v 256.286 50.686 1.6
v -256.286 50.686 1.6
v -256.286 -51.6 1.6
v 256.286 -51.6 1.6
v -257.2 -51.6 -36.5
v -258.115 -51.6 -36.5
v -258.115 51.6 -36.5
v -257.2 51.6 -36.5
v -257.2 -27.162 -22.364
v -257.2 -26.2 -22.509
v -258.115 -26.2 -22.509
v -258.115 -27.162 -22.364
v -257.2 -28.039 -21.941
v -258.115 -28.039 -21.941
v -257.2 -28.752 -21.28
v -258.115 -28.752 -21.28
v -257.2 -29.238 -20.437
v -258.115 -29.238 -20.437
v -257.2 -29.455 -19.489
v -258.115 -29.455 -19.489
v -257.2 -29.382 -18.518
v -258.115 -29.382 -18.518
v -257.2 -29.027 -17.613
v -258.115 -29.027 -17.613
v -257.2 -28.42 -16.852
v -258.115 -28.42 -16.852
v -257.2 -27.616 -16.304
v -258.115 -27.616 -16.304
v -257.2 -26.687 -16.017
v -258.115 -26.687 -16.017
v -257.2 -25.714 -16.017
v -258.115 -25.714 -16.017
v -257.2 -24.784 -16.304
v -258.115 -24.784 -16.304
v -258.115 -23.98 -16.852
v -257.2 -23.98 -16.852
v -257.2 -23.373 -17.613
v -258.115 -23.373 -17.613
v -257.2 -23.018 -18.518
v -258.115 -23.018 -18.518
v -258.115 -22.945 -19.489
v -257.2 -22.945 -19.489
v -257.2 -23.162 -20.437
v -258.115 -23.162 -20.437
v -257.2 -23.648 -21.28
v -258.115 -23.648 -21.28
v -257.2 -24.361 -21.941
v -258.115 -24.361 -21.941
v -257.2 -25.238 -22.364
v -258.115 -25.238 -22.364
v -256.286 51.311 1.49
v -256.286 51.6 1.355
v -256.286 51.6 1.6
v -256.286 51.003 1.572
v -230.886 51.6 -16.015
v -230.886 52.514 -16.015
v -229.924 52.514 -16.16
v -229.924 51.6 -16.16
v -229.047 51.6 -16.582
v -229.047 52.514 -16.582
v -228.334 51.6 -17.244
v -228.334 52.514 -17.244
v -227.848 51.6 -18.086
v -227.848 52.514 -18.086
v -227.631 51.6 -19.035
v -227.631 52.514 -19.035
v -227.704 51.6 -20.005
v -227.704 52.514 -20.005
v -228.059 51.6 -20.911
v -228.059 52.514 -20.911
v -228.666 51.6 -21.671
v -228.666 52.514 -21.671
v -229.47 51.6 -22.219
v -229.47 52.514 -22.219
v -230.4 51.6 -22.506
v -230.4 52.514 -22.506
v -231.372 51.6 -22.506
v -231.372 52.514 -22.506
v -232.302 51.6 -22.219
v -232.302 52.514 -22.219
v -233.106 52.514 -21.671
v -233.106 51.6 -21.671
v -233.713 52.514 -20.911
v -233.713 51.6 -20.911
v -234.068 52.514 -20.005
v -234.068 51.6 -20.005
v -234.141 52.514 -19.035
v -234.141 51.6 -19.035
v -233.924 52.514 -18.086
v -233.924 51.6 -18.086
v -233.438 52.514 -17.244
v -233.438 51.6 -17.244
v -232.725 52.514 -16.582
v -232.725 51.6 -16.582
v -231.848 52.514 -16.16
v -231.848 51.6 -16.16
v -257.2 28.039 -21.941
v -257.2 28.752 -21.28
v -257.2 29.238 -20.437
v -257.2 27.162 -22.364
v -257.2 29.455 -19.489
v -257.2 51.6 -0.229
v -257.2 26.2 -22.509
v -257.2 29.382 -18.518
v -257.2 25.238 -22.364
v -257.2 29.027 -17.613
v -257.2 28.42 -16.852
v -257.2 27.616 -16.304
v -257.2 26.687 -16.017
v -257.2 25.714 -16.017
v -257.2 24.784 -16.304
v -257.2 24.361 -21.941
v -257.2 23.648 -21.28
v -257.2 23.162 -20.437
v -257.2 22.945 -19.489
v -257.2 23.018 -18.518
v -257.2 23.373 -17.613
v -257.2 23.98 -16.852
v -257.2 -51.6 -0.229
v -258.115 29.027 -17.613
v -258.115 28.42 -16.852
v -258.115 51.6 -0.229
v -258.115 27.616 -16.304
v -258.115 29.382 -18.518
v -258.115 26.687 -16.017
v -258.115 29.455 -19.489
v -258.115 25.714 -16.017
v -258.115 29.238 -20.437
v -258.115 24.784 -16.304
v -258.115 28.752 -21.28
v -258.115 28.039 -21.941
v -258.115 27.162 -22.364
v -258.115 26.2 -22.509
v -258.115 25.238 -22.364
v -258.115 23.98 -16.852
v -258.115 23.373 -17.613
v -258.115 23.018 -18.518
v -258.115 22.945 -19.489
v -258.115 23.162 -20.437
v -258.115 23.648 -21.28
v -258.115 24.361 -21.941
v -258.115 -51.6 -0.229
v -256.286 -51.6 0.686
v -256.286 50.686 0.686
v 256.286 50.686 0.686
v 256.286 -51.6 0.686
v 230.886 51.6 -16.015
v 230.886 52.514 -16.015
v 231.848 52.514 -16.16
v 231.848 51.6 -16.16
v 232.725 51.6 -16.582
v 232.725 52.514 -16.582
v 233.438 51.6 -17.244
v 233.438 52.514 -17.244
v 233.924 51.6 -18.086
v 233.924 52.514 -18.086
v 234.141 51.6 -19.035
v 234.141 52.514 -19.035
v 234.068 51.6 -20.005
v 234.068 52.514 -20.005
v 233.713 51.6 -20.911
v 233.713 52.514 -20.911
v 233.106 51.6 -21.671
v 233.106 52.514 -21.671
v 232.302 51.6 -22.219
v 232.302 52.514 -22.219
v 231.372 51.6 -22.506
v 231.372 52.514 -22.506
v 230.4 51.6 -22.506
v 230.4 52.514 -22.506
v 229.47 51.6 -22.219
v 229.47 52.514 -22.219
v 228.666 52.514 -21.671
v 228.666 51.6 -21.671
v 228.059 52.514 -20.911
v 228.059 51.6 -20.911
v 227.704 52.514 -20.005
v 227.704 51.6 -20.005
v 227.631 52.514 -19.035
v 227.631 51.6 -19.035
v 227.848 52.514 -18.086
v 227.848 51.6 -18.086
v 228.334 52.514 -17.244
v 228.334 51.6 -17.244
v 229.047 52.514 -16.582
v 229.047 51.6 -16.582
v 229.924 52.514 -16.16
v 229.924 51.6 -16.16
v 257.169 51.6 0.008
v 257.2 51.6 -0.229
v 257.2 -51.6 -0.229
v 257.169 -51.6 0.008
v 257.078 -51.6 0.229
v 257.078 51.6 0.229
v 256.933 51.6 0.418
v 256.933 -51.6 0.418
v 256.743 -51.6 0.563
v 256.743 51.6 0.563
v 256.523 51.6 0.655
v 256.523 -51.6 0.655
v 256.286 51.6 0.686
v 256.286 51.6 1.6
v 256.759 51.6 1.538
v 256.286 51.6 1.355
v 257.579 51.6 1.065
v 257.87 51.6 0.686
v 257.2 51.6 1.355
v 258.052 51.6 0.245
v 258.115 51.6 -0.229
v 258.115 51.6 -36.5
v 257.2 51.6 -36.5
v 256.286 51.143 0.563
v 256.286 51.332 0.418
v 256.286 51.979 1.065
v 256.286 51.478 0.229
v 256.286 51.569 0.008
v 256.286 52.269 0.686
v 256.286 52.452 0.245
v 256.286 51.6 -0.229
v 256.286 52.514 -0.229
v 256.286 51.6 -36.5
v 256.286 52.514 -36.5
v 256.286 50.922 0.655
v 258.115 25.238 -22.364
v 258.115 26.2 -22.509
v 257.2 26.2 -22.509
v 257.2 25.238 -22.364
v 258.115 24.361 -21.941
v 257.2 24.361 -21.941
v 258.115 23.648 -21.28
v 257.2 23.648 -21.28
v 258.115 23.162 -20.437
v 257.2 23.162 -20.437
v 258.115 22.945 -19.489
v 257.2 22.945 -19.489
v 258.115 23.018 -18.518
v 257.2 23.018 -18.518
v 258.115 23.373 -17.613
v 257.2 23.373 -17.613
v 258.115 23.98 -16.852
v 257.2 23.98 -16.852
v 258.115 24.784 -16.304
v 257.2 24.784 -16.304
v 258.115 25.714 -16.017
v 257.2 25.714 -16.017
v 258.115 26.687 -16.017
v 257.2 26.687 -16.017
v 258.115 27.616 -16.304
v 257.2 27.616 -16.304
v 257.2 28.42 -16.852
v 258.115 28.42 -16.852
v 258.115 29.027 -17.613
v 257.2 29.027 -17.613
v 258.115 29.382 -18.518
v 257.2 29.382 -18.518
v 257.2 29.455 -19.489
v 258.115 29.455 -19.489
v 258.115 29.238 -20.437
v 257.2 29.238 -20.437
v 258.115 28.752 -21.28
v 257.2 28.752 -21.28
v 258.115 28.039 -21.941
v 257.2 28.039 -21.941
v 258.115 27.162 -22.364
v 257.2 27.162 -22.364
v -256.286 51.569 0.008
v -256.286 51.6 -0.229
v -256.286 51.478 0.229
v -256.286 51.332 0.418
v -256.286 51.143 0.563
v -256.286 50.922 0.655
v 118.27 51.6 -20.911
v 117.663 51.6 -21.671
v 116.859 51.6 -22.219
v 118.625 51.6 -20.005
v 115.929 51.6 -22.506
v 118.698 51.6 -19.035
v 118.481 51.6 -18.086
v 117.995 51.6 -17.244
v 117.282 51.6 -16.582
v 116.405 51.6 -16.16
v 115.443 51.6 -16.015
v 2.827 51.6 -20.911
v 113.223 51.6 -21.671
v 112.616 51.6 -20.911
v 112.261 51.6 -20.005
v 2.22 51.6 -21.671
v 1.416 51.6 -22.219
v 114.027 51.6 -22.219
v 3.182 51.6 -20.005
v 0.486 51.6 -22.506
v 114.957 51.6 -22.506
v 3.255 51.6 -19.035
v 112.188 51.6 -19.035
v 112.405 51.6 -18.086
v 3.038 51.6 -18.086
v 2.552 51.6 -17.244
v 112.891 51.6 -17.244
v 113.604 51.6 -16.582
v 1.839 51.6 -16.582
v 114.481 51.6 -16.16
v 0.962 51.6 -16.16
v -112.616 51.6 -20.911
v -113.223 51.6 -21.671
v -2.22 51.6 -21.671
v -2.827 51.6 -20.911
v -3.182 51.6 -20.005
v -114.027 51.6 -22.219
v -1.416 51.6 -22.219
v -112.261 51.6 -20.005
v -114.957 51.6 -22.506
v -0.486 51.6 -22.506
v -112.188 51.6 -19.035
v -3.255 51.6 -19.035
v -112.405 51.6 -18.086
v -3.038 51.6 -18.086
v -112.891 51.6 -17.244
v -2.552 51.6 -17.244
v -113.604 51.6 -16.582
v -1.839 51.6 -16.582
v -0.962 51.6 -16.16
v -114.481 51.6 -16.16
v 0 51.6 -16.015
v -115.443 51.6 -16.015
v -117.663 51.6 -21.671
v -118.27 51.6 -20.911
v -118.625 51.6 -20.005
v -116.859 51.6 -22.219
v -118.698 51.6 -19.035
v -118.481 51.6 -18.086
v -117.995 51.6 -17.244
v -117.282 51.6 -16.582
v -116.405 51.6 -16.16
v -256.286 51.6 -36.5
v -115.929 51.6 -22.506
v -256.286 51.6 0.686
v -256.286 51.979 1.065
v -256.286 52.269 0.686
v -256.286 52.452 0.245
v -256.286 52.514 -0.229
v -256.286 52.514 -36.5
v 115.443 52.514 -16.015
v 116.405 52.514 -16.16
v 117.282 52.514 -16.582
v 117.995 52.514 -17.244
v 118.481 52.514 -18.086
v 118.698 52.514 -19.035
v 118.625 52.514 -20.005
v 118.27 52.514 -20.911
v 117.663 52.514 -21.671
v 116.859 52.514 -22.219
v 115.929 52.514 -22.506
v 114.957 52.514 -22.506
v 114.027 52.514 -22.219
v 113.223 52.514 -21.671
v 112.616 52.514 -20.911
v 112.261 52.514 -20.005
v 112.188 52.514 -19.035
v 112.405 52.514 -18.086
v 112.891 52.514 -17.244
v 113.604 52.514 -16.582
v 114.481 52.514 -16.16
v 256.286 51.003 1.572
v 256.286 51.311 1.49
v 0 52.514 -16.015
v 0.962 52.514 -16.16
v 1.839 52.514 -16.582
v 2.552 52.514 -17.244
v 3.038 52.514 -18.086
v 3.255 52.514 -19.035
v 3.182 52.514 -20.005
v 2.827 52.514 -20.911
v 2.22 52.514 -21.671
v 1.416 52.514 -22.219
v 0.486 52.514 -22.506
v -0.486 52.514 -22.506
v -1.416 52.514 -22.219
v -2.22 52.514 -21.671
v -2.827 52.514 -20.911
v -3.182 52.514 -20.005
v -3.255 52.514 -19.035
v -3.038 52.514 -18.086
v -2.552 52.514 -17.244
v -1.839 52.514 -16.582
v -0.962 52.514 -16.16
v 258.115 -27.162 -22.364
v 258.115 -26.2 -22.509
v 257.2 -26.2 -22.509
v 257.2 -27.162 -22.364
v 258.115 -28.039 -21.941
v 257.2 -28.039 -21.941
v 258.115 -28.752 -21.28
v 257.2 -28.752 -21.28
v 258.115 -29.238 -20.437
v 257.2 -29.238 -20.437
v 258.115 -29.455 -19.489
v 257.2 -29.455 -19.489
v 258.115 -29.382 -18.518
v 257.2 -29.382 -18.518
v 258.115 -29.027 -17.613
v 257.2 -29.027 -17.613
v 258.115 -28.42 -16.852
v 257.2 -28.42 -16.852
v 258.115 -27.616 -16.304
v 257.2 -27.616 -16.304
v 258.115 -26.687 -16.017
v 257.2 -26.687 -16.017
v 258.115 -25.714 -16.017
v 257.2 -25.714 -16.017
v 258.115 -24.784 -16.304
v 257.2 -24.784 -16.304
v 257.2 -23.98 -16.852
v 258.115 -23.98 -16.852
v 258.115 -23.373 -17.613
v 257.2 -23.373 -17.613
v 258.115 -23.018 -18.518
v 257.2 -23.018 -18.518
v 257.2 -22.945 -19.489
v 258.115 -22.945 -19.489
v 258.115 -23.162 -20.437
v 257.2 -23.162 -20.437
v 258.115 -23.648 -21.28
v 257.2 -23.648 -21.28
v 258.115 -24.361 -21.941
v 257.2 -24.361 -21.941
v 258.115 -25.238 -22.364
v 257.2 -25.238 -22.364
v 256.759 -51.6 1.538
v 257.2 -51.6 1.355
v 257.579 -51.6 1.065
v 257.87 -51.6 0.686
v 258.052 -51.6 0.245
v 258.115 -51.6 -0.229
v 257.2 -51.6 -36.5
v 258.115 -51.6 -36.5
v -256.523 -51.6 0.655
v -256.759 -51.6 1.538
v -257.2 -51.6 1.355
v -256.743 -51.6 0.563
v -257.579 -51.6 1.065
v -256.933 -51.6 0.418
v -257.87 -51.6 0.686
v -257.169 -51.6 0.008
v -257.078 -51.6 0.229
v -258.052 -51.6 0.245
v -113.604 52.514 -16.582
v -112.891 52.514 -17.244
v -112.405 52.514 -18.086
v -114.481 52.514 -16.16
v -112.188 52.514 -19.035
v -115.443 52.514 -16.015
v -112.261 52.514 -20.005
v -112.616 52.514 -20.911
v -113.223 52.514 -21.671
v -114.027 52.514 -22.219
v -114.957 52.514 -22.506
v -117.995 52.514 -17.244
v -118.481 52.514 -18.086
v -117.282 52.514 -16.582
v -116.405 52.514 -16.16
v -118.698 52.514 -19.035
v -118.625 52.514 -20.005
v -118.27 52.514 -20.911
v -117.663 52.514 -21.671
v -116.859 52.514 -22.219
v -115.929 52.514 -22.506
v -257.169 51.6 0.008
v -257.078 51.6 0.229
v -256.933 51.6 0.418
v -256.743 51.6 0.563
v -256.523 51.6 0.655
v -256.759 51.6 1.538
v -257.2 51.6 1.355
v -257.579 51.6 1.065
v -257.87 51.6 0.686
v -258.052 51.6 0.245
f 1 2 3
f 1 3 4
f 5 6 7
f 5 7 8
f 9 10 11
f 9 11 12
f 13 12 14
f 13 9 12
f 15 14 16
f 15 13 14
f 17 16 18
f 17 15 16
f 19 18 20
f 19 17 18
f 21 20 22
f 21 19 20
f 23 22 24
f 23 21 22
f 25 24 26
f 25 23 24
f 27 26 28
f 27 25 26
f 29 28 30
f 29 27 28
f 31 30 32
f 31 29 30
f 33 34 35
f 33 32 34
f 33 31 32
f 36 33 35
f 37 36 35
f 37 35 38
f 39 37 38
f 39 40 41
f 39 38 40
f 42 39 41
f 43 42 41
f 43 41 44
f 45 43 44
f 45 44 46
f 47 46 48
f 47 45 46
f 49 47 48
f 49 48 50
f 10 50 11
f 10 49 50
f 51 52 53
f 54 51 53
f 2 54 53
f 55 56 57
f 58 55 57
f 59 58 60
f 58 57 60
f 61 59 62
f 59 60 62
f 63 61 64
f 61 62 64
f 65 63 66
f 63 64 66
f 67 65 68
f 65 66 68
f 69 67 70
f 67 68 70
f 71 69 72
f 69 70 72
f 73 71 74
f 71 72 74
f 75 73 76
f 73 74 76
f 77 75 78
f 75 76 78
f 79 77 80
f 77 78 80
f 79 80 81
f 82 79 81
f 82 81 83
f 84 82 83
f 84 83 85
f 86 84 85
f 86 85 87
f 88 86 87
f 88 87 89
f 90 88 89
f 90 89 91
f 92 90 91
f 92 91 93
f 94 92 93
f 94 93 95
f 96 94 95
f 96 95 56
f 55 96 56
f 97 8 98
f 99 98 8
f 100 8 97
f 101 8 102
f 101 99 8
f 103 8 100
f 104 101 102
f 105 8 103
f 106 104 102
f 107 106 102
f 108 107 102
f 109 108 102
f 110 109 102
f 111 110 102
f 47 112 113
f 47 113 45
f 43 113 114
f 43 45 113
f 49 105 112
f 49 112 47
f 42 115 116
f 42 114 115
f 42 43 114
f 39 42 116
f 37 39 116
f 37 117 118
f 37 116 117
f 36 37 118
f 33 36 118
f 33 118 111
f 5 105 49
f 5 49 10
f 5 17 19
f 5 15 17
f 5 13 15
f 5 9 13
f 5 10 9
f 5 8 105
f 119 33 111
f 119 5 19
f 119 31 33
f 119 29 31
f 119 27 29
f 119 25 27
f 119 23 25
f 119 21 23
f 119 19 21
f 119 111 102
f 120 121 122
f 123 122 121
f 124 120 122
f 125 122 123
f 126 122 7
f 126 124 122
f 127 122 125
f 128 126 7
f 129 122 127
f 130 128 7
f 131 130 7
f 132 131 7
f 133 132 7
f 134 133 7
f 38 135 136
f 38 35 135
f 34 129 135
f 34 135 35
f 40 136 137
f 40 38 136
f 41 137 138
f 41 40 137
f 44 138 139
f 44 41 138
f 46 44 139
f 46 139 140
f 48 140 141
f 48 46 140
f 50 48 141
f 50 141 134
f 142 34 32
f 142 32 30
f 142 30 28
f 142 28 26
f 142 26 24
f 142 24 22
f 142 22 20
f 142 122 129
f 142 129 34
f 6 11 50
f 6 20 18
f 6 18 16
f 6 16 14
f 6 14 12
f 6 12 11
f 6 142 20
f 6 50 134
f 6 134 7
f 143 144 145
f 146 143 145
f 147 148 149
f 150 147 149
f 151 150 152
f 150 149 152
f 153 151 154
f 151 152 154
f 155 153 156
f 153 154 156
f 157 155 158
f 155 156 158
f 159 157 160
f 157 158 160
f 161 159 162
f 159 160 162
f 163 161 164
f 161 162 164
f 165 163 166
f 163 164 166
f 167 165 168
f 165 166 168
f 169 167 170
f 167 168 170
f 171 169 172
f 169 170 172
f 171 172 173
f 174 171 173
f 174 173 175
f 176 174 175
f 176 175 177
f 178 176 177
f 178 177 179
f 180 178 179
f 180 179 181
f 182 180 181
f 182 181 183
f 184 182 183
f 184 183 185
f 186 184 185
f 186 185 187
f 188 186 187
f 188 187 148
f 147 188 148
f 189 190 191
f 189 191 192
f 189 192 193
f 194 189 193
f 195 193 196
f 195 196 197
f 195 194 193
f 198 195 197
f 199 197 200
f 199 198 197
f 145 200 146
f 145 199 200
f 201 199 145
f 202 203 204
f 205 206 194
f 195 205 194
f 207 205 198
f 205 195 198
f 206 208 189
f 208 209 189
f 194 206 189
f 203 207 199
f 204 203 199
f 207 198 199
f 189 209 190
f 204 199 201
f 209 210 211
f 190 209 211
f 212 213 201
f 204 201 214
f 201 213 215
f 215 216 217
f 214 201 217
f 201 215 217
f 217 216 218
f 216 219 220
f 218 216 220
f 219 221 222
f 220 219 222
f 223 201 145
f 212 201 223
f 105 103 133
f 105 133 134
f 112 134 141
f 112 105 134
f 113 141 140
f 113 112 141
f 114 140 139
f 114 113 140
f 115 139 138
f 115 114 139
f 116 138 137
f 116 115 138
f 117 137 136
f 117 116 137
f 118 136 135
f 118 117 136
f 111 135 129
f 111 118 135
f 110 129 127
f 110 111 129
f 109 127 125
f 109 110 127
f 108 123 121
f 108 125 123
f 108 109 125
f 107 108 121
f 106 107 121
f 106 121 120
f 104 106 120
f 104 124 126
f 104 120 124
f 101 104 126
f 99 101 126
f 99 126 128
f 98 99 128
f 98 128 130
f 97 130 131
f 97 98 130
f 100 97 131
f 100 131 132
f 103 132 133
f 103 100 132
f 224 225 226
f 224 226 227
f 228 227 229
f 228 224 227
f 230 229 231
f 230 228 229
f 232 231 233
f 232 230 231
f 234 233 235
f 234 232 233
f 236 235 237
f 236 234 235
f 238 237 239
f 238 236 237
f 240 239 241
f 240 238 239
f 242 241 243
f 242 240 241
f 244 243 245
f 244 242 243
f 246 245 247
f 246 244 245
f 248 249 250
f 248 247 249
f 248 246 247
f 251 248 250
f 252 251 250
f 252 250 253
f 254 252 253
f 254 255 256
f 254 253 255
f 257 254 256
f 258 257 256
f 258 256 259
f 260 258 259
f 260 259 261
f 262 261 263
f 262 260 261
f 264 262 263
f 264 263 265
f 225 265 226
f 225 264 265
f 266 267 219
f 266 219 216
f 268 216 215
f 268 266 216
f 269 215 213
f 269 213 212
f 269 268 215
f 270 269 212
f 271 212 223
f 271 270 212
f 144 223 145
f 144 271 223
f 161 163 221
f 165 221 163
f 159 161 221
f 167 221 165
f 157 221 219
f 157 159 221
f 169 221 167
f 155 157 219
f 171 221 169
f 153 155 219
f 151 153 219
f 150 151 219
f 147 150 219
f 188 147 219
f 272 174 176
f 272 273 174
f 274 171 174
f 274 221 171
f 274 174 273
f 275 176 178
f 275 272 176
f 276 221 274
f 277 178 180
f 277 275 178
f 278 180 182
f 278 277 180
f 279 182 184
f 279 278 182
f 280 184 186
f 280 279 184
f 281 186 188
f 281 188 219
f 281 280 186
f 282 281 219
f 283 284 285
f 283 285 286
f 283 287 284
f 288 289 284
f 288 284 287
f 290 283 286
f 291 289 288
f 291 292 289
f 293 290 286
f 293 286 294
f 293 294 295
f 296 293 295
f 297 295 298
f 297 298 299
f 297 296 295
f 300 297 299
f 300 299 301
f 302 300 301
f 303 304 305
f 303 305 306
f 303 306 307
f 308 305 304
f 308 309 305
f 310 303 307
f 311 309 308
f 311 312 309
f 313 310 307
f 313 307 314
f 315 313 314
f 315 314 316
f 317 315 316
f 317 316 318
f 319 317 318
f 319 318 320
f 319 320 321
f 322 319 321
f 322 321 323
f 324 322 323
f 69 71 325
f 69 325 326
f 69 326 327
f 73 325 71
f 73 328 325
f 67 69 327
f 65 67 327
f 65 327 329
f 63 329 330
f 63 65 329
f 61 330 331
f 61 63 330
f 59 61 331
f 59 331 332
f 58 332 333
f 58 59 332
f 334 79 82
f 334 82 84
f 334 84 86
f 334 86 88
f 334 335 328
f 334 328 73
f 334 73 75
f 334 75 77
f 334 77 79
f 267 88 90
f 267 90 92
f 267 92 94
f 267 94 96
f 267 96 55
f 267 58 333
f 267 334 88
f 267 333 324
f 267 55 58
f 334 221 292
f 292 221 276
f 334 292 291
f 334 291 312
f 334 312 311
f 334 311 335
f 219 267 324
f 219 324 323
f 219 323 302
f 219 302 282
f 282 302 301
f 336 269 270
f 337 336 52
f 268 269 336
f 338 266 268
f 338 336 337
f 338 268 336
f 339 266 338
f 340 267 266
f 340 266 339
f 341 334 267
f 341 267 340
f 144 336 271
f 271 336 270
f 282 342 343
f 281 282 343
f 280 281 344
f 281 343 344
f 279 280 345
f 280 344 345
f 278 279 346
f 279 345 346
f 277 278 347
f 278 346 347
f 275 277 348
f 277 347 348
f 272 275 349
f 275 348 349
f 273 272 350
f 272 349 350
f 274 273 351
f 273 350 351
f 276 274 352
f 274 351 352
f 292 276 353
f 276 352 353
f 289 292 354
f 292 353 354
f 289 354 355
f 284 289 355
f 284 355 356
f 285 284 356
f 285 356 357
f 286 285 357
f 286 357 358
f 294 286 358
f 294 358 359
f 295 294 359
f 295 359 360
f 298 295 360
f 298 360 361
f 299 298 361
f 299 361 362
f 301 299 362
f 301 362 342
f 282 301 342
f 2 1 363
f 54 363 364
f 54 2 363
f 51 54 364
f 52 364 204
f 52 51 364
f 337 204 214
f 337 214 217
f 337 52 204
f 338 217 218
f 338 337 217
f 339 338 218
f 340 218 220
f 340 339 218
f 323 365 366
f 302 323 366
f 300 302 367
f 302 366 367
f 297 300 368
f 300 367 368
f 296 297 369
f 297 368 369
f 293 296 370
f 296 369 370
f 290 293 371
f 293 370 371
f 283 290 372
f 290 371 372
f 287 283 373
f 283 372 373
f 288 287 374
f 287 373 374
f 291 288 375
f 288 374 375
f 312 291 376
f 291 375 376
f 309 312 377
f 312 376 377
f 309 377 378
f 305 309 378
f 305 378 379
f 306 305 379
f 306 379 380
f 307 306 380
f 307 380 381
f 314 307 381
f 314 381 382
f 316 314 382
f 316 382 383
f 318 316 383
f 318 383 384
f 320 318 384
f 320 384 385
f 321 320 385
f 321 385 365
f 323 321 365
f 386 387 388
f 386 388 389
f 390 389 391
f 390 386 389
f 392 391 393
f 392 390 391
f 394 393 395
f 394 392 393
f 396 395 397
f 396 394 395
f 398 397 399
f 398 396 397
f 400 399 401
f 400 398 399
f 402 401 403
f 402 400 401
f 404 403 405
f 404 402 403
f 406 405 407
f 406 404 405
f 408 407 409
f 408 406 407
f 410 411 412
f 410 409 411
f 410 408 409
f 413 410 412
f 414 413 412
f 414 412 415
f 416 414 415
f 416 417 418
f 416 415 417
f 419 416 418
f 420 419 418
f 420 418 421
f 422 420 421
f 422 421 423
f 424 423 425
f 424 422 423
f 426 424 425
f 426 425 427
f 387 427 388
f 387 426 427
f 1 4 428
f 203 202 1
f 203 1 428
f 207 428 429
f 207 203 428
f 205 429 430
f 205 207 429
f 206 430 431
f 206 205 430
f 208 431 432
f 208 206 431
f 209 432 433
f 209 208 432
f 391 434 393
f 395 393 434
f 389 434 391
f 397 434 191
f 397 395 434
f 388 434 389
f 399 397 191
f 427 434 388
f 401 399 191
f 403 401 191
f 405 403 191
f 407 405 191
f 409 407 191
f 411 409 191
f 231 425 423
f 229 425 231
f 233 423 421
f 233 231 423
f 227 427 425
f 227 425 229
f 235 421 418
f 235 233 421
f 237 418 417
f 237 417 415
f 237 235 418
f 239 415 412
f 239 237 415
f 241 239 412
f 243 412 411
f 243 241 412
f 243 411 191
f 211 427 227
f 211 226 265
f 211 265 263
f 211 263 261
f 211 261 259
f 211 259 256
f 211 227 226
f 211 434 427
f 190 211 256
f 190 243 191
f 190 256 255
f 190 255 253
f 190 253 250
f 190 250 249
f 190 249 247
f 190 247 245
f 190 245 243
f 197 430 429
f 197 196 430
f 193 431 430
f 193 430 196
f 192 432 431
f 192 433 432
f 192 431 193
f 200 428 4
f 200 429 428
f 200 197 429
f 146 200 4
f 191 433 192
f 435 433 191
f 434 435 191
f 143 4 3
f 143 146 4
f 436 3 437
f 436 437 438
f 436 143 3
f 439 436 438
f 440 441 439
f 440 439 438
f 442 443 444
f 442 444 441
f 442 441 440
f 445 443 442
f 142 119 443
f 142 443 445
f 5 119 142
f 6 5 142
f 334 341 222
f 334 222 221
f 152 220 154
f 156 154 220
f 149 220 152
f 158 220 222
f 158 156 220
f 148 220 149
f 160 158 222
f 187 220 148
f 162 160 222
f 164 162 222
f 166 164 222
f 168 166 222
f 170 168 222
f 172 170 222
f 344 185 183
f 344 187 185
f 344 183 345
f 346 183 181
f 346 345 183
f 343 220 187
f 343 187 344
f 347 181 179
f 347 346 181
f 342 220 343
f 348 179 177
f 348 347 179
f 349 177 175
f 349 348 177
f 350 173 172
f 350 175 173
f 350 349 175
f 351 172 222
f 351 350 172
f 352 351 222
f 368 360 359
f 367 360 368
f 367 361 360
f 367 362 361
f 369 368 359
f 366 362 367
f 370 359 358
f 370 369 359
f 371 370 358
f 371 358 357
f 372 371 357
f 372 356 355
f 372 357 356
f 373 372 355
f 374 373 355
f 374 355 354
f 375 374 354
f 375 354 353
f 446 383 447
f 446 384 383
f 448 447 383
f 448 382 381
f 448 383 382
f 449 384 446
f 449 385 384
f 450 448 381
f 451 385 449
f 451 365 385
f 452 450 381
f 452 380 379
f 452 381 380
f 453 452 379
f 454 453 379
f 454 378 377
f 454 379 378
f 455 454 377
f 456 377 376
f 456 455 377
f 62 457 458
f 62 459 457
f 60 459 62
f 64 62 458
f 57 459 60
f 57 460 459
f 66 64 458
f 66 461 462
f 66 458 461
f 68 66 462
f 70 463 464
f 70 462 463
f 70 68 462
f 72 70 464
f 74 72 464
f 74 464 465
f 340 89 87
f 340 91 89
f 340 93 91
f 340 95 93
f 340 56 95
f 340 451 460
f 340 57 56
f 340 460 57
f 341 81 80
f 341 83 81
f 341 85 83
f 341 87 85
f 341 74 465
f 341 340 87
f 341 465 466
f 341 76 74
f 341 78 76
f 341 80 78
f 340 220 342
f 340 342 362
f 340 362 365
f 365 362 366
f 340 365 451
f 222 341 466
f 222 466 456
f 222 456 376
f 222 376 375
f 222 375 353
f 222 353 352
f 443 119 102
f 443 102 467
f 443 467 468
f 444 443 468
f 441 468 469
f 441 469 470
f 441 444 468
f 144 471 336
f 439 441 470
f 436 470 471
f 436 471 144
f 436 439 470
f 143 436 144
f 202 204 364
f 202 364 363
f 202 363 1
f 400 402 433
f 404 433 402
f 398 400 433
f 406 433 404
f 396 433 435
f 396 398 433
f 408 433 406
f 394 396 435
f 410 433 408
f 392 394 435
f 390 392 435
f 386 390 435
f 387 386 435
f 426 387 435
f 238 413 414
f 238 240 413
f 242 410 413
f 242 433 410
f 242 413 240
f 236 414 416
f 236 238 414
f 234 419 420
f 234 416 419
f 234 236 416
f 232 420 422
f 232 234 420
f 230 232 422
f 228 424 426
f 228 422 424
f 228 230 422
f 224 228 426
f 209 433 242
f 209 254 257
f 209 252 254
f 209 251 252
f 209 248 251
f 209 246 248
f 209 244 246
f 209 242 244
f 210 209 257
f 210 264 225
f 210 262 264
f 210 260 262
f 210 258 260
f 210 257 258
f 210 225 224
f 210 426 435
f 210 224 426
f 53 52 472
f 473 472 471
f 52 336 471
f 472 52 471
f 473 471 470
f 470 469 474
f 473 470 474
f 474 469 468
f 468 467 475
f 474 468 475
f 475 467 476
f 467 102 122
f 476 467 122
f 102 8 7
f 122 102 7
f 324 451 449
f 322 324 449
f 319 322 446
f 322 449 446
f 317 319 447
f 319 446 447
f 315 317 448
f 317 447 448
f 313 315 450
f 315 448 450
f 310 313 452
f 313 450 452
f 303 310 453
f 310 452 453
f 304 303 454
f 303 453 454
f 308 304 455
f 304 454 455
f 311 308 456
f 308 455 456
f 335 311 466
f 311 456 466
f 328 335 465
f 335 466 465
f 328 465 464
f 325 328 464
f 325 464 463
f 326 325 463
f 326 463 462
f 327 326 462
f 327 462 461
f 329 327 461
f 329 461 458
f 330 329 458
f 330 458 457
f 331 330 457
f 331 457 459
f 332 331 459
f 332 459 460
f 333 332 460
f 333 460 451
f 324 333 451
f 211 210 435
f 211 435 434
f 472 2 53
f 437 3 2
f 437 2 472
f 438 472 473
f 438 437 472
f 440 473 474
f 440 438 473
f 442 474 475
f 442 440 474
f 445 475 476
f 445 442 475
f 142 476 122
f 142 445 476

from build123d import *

# Parameters (mm, degrees)
SKETCH1_W                    = 514.4008
SKETCH1_H                    = 103.2002
BOSS_EXTRUDE1_DEPTH          = 1.6002
CONVERT_SOLID1_OUTLINE_W     = 514.4008
CONVERT_SOLID1_OUTLINE_H     = 103.2002
CONVERT_SOLID1_DEPTH         = 0.6858
EDGE_FLANGE1_STRIP_W         = 5.4864
EDGE_FLANGE1_STRIP_H         = 0.9144
EDGE_FLANGE1_STRIP_CUT_DEPTH = 103.2002
EDGE_FLANGE1_DEPTH           = 103.2002
EDGE_FLANGE2_STRIP_W         = 5.4864
EDGE_FLANGE2_STRIP_H         = 0.9144
EDGE_FLANGE2_STRIP_CUT_DEPTH = 103.2002
EDGE_FLANGE2_DEPTH           = 103.2002
CUT_EXTRUDE3_DEPTH           = 521.084421643
CUT_EXTRUDE3_DEPTH_BACK      = 521.084421643
SKETCH18_R                   = 3.2639
EDGE_FLANGE3_STRIP_W         = 5.4864
EDGE_FLANGE3_STRIP_H         = 0.9144
EDGE_FLANGE3_STRIP_CUT_DEPTH = 512.572
EDGE_FLANGE3_DEPTH           = 512.572
SKETCH22_R                   = 3.2639
CUT_EXTRUDE4_DEPTH           = 2.54


# Read off the part's stored shape, not the designer's step: Convert-Solid1
# Sheet-metal steps are written as plain solids
with BuildPart() as part:
    # Sketch1 → Boss-Extrude1 (new body)
    with BuildSketch(Plane.XY):
        Rectangle(SKETCH1_W, SKETCH1_H)
    extrude(amount=BOSS_EXTRUDE1_DEPTH)

    # Convert-Solid1 outline → Convert-Solid1 (cut)
    with BuildSketch(Plane.XY):
        Rectangle(CONVERT_SOLID1_OUTLINE_W, CONVERT_SOLID1_OUTLINE_H)
    extrude(amount=CONVERT_SOLID1_DEPTH, mode=Mode.SUBTRACT)

    # Edge-Flange1 strip (across the edge) → Edge-Flange1 strip cut (cut)
    with BuildSketch(Plane(origin=(257.2004, 51.6001, 0.6858), x_dir=(-1, 0, 0), z_dir=(0, -1, 0))):
        with Locations((-1.8288, -0.4572)):
            Rectangle(EDGE_FLANGE1_STRIP_W, EDGE_FLANGE1_STRIP_H)
    extrude(amount=EDGE_FLANGE1_STRIP_CUT_DEPTH, mode=Mode.SUBTRACT)

    # Edge-Flange1 section (across the edge) → Edge-Flange1 (add)
    with BuildSketch(Plane(origin=(257.2004, 51.6001, 0.6858), x_dir=(-1, 0, 0), z_dir=(0, -1, 0))):
        with BuildLine():
            Line((-0.9144, 0.9144), (-0.9144, 37.1856))
            Line((-0.9144, 37.1856), (0, 37.1856))
            Line((0, 37.1856), (0, 0.9144))
            ThreePointArc((0, 0.9144), (0.267821559, 0.267821559), (0.9144, 0))
            Line((0.9144, 0), (0.9144, -0.9144))
            ThreePointArc((0.9144, -0.9144), (-0.378756881, -0.378756881), (-0.9144, 0.9144))
        make_face()
    extrude(amount=EDGE_FLANGE1_DEPTH)

    # Edge-Flange2 strip (across the edge) → Edge-Flange2 strip cut (cut)
    with BuildSketch(Plane(origin=(-257.2004, -51.6001, 0.6858), x_dir=(1, 0, 0), z_dir=(0, 1, 0))):
        with Locations((-1.8288, -0.4572)):
            Rectangle(EDGE_FLANGE2_STRIP_W, EDGE_FLANGE2_STRIP_H)
    extrude(amount=EDGE_FLANGE2_STRIP_CUT_DEPTH, mode=Mode.SUBTRACT)

    # Edge-Flange2 section (across the edge) → Edge-Flange2 (add)
    with BuildSketch(Plane(origin=(-257.2004, -51.6001, 0.6858), x_dir=(1, 0, 0), z_dir=(0, 1, 0))):
        with BuildLine():
            Line((-0.9144, 0.9144), (-0.9144, 37.1856))
            Line((-0.9144, 37.1856), (0, 37.1856))
            Line((0, 37.1856), (0, 0.9144))
            ThreePointArc((0, 0.9144), (0.267821559, 0.267821559), (0.9144, 0))
            Line((0.9144, 0), (0.9144, -0.9144))
            ThreePointArc((0.9144, -0.9144), (-0.378756881, -0.378756881), (-0.9144, 0.9144))
        make_face()
    extrude(amount=EDGE_FLANGE2_DEPTH)

    # Sketch18 → Cut-Extrude3 (cut, two sides: drawn at the far end of the back side and taken through both)
    with BuildSketch(Plane.ZY.offset(258.1148).offset(-CUT_EXTRUDE3_DEPTH_BACK)):
        with Locations(Location((-19.244729261, 26.2001, 0), (0, 0, 180))):
            Circle(SKETCH18_R)
        with Locations(Location((-19.244729261, -26.2001, 0), (0, 0, 180))):
            Circle(SKETCH18_R)
    extrude(amount=CUT_EXTRUDE3_DEPTH + CUT_EXTRUDE3_DEPTH_BACK, mode=Mode.SUBTRACT)

    # Edge-Flange3 strip (across the edge) → Edge-Flange3 strip cut (cut)
    with BuildSketch(Plane(origin=(-256.286, 51.6001, 0.6858), x_dir=(0, -1, 0), z_dir=(1, 0, 0))):
        with Locations((-1.8288, -0.4572)):
            Rectangle(EDGE_FLANGE3_STRIP_W, EDGE_FLANGE3_STRIP_H)
    extrude(amount=EDGE_FLANGE3_STRIP_CUT_DEPTH, mode=Mode.SUBTRACT)

    # Edge-Flange3 section (across the edge) → Edge-Flange3 (add)
    with BuildSketch(Plane(origin=(-256.286, 51.6001, 0.6858), x_dir=(0, -1, 0), z_dir=(1, 0, 0))):
        with BuildLine():
            Line((-0.9144, 0.9144), (-0.9144, 37.1856))
            Line((-0.9144, 37.1856), (0, 37.1856))
            Line((0, 37.1856), (0, 0.9144))
            ThreePointArc((0, 0.9144), (0.267821559, 0.267821559), (0.9144, 0))
            Line((0.9144, 0), (0.9144, -0.9144))
            ThreePointArc((0.9144, -0.9144), (-0.378756881, -0.378756881), (-0.9144, 0.9144))
        make_face()
    extrude(amount=EDGE_FLANGE3_DEPTH)

    # Sketch22 → Cut-Extrude4 (cut)
    with BuildSketch(Plane(origin=(0, 52.5145, 0), x_dir=(1, 0, 0), z_dir=(0, 1, 0))):
        with Locations(Location((230.886, 19.2786, 0), (0, 0, 270))):
            Circle(SKETCH22_R)
        with Locations(Location((115.443, 19.2786, 0), (0, 0, 270))):
            Circle(SKETCH22_R)
        with Locations(Location((0, 19.2786, 0), (0, 0, 270))):
            Circle(SKETCH22_R)
        with Locations(Location((-115.443, 19.2786, 0), (0, 0, 270))):
            Circle(SKETCH22_R)
        with Locations(Location((-230.886, 19.2786, 0), (0, 0, 270))):
            Circle(SKETCH22_R)
    extrude(amount=-CUT_EXTRUDE4_DEPTH, mode=Mode.SUBTRACT)


solid = part.part
